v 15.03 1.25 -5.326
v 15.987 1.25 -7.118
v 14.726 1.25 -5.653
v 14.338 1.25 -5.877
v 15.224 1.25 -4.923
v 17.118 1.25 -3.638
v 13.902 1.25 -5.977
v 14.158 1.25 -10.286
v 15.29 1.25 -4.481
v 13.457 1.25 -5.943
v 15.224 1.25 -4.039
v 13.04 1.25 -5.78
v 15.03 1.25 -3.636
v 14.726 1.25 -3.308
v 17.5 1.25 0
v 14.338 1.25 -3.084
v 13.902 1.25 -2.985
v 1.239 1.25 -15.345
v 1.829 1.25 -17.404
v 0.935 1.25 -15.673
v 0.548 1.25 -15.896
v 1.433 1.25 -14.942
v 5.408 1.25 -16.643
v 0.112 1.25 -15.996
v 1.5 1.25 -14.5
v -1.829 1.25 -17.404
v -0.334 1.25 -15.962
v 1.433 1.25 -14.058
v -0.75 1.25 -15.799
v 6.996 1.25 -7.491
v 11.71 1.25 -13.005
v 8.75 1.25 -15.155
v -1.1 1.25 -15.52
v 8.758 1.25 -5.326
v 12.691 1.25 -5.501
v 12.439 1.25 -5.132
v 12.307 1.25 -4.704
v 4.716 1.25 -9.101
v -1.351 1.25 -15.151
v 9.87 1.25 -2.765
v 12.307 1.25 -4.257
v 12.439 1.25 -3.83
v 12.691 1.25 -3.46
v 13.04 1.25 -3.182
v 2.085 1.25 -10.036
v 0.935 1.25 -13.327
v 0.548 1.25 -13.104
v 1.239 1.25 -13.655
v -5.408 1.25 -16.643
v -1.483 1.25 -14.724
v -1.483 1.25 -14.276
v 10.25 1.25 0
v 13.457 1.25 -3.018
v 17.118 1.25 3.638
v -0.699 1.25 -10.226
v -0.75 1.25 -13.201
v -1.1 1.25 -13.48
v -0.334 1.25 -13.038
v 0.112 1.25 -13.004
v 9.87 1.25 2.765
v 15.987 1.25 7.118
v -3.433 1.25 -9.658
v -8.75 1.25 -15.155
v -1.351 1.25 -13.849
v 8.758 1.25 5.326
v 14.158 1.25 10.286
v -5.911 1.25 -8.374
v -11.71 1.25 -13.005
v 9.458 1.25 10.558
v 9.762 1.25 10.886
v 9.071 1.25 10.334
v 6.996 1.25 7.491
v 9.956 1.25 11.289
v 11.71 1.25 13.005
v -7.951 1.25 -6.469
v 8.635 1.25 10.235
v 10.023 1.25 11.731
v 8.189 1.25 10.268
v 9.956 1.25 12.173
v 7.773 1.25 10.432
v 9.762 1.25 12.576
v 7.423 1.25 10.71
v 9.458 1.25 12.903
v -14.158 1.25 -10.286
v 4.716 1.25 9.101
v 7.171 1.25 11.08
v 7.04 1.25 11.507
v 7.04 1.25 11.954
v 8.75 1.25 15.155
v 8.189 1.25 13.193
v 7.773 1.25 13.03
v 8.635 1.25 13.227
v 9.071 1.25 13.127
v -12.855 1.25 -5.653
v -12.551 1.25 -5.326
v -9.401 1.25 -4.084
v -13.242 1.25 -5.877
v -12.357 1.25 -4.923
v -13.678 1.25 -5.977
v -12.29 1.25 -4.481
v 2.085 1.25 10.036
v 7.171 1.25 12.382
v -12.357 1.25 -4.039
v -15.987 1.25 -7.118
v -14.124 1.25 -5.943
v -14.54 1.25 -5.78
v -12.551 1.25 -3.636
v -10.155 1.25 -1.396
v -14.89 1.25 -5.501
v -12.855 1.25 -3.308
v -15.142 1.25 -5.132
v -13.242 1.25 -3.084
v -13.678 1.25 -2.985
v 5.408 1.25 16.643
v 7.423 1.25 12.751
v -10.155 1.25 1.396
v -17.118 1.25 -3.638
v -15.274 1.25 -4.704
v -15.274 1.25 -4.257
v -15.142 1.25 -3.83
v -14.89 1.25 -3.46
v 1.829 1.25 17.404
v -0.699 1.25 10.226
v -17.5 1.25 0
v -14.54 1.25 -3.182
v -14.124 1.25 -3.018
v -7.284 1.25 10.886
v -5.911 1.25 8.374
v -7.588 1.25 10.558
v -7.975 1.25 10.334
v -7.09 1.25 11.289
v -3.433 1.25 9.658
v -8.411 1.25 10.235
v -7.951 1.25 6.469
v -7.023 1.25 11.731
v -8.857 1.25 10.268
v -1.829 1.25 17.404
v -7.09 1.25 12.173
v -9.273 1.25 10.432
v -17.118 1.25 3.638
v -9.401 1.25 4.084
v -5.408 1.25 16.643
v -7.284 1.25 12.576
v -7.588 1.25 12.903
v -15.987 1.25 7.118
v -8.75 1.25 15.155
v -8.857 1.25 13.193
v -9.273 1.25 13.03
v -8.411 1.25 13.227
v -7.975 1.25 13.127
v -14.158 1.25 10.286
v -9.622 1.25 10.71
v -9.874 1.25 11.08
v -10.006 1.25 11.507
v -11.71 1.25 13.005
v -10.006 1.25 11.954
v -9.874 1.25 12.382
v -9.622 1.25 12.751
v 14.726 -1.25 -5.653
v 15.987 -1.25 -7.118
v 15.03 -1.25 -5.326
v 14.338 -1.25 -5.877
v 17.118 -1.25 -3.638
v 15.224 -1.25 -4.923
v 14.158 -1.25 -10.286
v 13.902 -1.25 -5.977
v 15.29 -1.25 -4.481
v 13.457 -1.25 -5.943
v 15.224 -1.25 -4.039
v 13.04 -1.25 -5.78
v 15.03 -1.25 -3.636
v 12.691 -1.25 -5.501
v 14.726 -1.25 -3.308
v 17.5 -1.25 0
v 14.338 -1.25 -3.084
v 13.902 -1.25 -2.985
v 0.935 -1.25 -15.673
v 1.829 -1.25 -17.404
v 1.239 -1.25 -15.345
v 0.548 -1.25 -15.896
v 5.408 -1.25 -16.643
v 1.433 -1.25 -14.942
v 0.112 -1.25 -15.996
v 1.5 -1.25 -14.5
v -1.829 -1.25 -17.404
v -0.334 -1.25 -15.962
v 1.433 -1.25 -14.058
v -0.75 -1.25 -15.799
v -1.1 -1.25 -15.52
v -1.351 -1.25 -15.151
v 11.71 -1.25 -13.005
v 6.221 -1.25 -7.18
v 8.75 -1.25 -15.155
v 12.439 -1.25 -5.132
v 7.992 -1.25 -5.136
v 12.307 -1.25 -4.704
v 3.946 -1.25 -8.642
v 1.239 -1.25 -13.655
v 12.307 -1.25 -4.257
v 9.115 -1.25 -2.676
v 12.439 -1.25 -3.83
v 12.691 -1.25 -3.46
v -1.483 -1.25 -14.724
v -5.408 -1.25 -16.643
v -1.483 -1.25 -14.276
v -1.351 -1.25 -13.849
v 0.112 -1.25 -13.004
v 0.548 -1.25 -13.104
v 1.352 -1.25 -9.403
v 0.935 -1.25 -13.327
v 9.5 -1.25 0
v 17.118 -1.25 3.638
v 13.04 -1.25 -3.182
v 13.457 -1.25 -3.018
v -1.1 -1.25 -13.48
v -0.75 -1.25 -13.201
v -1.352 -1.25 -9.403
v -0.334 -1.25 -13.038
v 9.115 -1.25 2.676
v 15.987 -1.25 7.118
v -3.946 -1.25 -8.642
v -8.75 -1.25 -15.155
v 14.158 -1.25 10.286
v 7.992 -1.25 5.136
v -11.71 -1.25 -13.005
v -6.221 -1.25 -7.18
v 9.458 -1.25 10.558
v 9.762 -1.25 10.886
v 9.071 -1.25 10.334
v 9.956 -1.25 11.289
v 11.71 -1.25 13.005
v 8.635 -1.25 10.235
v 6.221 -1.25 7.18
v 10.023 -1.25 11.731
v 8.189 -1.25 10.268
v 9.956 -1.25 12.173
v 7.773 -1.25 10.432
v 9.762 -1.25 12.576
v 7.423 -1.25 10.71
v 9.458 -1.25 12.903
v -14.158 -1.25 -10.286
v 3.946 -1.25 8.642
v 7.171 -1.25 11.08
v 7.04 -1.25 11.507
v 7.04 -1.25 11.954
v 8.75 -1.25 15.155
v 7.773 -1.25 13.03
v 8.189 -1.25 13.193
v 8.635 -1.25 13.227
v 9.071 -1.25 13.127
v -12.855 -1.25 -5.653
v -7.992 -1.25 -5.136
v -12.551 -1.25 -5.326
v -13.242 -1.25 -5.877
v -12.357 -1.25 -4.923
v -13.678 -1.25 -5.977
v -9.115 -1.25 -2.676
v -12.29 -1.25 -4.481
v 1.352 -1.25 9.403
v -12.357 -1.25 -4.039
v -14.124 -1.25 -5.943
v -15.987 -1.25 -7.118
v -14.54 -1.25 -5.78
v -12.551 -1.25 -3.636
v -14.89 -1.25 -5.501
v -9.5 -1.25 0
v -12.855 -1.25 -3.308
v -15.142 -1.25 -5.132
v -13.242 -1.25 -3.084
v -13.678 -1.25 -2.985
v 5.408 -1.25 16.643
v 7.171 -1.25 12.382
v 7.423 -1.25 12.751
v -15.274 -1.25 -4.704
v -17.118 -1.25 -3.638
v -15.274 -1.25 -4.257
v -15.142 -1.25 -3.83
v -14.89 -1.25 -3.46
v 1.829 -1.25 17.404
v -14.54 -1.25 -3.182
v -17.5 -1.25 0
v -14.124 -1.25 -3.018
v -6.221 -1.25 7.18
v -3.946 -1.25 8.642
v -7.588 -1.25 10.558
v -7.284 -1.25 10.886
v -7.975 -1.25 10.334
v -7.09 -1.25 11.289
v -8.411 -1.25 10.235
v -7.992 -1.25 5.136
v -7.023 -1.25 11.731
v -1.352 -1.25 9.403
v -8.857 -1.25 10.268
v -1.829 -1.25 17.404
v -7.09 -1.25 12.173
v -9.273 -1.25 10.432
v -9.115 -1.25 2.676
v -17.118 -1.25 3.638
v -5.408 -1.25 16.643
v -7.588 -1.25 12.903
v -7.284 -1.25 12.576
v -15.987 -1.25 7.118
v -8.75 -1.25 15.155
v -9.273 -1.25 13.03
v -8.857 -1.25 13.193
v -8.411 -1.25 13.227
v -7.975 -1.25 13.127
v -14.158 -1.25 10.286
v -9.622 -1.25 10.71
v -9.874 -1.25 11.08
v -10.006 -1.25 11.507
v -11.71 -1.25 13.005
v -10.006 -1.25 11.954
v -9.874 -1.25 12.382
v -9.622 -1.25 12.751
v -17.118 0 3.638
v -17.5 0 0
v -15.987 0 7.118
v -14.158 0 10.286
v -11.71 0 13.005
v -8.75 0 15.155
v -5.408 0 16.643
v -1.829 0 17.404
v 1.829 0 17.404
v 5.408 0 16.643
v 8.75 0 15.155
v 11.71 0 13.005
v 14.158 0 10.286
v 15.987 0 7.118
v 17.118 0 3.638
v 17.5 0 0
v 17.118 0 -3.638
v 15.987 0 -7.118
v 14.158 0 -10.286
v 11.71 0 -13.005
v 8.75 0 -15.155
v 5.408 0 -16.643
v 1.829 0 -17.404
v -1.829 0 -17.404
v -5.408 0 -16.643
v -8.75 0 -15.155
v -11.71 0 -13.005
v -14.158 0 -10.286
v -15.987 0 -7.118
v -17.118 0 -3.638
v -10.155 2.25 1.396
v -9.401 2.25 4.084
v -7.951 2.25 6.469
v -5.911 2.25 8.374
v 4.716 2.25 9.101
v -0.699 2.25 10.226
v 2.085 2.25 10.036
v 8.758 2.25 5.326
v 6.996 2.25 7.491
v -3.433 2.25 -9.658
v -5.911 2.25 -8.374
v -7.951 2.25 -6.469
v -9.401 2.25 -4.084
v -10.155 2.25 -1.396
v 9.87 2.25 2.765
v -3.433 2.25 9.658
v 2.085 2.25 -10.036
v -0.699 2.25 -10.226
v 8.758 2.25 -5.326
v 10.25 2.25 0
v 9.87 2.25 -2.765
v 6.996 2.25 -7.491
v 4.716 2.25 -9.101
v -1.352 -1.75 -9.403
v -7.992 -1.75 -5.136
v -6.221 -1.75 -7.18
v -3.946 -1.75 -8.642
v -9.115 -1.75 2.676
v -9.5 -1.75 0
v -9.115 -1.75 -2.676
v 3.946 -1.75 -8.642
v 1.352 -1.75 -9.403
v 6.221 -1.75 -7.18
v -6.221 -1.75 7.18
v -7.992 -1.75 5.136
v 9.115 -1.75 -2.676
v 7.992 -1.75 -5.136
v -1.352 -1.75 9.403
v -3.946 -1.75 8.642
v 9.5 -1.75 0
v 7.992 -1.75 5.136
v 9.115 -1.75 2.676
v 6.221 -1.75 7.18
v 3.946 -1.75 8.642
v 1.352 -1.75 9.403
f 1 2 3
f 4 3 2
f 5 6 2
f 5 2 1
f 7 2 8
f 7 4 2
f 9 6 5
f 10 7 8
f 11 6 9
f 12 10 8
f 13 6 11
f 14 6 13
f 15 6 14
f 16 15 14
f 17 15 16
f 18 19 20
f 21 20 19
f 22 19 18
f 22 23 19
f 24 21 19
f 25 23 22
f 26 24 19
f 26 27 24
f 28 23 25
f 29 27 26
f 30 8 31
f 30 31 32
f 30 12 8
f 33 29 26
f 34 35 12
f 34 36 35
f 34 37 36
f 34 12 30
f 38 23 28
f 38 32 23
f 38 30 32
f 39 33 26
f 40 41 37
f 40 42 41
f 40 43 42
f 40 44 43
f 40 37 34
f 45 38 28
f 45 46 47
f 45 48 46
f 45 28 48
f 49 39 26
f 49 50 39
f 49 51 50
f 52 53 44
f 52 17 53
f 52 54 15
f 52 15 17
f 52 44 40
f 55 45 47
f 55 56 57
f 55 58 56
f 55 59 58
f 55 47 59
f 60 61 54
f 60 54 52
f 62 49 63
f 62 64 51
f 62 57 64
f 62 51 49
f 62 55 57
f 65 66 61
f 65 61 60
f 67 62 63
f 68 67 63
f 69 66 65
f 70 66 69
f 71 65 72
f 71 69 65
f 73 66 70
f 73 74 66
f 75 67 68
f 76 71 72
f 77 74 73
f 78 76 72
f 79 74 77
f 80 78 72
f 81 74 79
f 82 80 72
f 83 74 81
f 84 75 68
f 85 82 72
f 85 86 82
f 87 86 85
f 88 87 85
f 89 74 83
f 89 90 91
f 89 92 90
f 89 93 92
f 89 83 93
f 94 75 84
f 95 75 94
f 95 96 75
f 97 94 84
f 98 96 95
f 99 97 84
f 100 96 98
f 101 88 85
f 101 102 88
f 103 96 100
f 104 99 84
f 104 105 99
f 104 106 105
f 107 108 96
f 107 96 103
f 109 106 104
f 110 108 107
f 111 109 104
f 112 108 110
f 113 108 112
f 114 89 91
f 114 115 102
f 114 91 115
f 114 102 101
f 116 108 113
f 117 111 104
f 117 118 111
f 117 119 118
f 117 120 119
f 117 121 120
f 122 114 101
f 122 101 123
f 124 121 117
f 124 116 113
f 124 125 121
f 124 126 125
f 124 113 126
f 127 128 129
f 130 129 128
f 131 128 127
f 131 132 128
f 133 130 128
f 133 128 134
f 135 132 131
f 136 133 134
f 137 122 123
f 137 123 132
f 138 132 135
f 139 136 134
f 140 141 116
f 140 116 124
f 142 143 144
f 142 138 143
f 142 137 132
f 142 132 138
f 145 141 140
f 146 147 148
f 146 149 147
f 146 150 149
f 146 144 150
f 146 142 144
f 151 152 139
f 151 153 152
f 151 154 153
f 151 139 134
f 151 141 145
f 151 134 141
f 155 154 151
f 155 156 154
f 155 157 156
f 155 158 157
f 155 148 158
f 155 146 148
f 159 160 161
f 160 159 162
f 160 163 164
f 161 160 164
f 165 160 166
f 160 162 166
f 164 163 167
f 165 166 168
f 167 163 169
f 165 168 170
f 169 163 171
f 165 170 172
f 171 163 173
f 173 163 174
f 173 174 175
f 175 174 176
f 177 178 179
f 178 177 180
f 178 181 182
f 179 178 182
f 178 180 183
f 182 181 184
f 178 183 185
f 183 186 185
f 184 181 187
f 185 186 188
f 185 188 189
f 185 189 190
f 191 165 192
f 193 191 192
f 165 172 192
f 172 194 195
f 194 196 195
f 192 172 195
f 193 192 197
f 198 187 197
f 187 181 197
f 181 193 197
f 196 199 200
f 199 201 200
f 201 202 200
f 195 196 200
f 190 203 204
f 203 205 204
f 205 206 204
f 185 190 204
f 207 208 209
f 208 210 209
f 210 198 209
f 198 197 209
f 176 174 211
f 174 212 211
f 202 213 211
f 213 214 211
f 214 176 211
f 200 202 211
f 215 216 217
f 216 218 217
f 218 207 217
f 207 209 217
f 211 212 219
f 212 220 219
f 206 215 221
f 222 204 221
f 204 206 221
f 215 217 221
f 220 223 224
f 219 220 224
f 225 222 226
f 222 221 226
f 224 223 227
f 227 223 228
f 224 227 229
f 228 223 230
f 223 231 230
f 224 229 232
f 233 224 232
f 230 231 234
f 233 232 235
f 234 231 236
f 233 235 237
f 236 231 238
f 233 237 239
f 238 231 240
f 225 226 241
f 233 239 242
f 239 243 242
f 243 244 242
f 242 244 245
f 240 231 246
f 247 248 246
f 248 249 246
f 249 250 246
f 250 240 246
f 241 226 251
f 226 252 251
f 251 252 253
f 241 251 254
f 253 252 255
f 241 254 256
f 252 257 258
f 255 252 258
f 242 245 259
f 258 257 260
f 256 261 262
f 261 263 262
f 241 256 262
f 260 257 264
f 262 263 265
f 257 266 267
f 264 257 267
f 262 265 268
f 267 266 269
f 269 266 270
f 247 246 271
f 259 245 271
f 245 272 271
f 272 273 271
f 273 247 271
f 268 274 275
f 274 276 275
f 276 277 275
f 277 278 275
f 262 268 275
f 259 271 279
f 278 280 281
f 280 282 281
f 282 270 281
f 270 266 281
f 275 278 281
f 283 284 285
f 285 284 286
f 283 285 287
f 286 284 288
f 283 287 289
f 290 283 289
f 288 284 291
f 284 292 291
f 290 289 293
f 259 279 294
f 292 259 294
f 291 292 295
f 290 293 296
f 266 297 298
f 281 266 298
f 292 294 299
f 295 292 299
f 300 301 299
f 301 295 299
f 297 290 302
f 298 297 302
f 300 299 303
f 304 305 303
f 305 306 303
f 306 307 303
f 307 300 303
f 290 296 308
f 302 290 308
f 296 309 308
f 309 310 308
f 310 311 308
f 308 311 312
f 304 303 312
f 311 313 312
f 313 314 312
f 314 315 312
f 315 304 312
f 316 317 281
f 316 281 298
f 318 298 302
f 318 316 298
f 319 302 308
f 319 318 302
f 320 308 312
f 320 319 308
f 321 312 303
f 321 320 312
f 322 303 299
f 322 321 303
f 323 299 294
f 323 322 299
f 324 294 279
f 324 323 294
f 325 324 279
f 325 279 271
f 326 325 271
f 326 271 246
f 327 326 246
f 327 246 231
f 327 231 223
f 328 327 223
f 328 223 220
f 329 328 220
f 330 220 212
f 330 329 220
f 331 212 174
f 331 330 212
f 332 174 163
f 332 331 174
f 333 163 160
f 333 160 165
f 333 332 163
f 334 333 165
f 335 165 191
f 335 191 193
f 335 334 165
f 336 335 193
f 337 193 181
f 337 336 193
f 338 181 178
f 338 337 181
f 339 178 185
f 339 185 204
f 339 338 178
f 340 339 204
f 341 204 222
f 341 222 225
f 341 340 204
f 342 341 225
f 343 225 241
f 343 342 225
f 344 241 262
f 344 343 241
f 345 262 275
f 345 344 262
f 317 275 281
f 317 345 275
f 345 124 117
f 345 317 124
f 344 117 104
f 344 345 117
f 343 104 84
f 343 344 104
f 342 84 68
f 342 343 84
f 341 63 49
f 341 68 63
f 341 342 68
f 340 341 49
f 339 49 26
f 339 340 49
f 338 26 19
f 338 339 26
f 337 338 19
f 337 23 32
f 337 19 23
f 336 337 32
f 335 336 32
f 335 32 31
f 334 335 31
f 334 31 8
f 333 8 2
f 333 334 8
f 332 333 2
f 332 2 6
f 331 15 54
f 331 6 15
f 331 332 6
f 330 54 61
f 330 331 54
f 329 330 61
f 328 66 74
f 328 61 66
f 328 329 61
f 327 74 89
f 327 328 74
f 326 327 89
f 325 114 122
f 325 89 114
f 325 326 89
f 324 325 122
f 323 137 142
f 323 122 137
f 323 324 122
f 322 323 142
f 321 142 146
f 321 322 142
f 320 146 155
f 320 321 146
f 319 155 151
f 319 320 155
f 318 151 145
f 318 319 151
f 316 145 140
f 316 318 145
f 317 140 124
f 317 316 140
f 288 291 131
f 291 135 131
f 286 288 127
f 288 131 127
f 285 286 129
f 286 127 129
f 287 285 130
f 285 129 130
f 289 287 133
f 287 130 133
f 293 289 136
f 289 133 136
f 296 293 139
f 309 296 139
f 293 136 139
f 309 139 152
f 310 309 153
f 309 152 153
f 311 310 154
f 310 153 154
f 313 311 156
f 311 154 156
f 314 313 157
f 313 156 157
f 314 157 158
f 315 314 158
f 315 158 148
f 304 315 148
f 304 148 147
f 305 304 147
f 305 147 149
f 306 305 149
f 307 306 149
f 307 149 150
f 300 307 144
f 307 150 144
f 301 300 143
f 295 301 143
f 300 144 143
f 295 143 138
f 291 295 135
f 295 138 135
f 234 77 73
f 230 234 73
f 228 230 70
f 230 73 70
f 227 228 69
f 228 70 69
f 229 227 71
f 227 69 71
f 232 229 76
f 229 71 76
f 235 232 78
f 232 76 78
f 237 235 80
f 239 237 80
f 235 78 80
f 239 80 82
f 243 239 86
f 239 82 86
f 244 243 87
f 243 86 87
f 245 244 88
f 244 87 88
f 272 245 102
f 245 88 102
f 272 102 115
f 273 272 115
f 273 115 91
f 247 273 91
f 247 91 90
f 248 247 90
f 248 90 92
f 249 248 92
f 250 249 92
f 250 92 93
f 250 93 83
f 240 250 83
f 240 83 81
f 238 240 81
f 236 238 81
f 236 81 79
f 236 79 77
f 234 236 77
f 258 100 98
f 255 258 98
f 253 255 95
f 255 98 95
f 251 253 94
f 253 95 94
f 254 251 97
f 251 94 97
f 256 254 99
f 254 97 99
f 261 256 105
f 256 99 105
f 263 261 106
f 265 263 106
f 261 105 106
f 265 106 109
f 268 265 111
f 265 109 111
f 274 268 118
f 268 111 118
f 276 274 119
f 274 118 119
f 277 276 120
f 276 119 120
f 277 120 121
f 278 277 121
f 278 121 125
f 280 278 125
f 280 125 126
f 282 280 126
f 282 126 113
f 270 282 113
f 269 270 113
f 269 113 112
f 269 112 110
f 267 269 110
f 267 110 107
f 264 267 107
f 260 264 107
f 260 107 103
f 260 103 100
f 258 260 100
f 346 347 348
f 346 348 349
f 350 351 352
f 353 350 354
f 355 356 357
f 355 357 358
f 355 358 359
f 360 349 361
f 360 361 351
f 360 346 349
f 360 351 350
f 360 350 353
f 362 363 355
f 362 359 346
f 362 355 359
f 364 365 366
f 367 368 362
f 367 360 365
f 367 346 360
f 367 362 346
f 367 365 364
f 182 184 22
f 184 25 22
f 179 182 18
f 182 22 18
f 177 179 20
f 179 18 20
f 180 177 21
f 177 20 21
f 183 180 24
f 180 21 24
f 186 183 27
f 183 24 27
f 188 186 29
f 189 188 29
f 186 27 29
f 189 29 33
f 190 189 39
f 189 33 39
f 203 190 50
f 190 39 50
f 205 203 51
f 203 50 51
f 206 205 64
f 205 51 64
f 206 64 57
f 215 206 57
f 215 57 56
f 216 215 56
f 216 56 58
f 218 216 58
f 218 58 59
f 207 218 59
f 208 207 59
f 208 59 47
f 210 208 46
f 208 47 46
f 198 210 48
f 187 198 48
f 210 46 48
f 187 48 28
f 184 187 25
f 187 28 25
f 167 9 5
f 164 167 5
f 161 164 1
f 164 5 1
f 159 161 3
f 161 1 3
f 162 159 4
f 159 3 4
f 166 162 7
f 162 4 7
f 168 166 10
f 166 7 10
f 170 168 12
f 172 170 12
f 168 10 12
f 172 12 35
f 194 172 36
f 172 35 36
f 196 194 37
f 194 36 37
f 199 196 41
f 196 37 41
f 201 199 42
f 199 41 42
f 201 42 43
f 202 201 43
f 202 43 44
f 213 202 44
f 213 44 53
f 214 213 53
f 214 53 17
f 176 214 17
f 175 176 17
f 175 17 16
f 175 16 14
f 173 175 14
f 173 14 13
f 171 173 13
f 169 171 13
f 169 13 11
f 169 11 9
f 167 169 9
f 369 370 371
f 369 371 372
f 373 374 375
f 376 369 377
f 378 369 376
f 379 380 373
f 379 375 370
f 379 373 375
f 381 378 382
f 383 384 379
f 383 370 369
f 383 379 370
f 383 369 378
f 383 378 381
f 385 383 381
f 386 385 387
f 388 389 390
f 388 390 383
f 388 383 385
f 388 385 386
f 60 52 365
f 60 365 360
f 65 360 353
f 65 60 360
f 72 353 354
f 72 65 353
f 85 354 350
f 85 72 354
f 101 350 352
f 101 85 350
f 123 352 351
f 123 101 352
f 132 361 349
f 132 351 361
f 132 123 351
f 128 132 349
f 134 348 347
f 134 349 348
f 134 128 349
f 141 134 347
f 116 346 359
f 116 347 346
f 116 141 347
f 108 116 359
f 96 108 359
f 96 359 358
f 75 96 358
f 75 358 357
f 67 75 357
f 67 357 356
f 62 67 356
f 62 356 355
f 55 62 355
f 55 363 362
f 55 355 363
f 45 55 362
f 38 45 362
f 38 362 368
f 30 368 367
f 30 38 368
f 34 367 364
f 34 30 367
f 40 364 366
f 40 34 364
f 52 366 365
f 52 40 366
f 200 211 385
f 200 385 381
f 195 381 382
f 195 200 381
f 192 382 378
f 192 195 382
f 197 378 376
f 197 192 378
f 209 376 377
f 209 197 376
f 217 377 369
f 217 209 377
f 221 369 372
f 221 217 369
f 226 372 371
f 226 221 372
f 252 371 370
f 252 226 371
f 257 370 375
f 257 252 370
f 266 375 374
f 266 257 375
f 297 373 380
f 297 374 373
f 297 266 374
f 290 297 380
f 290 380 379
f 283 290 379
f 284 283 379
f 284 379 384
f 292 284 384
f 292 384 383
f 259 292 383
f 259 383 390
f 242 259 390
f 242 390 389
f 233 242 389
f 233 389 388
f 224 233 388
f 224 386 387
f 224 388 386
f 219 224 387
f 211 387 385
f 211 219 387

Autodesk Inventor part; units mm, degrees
ref_plane "YZ Plane" through (0, 0, 0) normal (1, 0, 0) x (0, 1, 0)
ref_plane "XZ Plane" through (0, 0, 0) normal (0, 1, 0) x (-1, 0, 0)
ref_plane "XY Plane" through (0, 0, 0) normal (0, 0, 1) x (1, 0, 0)
sketch "Sketch1" plane through (0, 0, 0) normal (0, 1, 0) x (-1, 0, 0)
  circle A0 centre (0, 0) radius 17.5
  dimension "d0" = 35
extrude "Extrusion1" add sketch "Sketch1" along normal mid plane 2.5
sketch "Sketch2" plane through (0, 1.25, 0) normal (0, 1, 0) x (1, 0, 0)
  circle A0 centre (0, 0) radius 10.25
  dimension "d3" = 20.5
extrude "Extrusion2" add sketch "Sketch2" along normal blind 1
sketch "Sketch3" plane through (0, -1.25, 0) normal (0, -1, 0) x (1, 0, 0)
  circle A0 centre (0, 0) radius 9.5
  dimension "d6" = 19
extrude "Extrusion3" add sketch "Sketch3" along normal blind 0.5
sketch "Sketch4" plane through (0, 1.25, 0) normal (0, 1, 0) x (1, 0, 0)
  circle A0 centre (0, 14.5) radius 1.5
  circle A1 centre (-13.7903, 4.4807) radius 1.5
  circle A2 centre (-8.5229, -11.7307) radius 1.5
  circle A3 centre (8.5229, -11.7307) radius 1.5
  circle A4 centre (13.7903, 4.4807) radius 1.5
  point P0 (0, 0)
  dimension "d9" = 3
  dimension "d10" = 14.5
  dimension "d13" = 360
extrude "Extrusion4" cut sketch "Sketch4" against normal through all
properties material "Iron, Cast"
